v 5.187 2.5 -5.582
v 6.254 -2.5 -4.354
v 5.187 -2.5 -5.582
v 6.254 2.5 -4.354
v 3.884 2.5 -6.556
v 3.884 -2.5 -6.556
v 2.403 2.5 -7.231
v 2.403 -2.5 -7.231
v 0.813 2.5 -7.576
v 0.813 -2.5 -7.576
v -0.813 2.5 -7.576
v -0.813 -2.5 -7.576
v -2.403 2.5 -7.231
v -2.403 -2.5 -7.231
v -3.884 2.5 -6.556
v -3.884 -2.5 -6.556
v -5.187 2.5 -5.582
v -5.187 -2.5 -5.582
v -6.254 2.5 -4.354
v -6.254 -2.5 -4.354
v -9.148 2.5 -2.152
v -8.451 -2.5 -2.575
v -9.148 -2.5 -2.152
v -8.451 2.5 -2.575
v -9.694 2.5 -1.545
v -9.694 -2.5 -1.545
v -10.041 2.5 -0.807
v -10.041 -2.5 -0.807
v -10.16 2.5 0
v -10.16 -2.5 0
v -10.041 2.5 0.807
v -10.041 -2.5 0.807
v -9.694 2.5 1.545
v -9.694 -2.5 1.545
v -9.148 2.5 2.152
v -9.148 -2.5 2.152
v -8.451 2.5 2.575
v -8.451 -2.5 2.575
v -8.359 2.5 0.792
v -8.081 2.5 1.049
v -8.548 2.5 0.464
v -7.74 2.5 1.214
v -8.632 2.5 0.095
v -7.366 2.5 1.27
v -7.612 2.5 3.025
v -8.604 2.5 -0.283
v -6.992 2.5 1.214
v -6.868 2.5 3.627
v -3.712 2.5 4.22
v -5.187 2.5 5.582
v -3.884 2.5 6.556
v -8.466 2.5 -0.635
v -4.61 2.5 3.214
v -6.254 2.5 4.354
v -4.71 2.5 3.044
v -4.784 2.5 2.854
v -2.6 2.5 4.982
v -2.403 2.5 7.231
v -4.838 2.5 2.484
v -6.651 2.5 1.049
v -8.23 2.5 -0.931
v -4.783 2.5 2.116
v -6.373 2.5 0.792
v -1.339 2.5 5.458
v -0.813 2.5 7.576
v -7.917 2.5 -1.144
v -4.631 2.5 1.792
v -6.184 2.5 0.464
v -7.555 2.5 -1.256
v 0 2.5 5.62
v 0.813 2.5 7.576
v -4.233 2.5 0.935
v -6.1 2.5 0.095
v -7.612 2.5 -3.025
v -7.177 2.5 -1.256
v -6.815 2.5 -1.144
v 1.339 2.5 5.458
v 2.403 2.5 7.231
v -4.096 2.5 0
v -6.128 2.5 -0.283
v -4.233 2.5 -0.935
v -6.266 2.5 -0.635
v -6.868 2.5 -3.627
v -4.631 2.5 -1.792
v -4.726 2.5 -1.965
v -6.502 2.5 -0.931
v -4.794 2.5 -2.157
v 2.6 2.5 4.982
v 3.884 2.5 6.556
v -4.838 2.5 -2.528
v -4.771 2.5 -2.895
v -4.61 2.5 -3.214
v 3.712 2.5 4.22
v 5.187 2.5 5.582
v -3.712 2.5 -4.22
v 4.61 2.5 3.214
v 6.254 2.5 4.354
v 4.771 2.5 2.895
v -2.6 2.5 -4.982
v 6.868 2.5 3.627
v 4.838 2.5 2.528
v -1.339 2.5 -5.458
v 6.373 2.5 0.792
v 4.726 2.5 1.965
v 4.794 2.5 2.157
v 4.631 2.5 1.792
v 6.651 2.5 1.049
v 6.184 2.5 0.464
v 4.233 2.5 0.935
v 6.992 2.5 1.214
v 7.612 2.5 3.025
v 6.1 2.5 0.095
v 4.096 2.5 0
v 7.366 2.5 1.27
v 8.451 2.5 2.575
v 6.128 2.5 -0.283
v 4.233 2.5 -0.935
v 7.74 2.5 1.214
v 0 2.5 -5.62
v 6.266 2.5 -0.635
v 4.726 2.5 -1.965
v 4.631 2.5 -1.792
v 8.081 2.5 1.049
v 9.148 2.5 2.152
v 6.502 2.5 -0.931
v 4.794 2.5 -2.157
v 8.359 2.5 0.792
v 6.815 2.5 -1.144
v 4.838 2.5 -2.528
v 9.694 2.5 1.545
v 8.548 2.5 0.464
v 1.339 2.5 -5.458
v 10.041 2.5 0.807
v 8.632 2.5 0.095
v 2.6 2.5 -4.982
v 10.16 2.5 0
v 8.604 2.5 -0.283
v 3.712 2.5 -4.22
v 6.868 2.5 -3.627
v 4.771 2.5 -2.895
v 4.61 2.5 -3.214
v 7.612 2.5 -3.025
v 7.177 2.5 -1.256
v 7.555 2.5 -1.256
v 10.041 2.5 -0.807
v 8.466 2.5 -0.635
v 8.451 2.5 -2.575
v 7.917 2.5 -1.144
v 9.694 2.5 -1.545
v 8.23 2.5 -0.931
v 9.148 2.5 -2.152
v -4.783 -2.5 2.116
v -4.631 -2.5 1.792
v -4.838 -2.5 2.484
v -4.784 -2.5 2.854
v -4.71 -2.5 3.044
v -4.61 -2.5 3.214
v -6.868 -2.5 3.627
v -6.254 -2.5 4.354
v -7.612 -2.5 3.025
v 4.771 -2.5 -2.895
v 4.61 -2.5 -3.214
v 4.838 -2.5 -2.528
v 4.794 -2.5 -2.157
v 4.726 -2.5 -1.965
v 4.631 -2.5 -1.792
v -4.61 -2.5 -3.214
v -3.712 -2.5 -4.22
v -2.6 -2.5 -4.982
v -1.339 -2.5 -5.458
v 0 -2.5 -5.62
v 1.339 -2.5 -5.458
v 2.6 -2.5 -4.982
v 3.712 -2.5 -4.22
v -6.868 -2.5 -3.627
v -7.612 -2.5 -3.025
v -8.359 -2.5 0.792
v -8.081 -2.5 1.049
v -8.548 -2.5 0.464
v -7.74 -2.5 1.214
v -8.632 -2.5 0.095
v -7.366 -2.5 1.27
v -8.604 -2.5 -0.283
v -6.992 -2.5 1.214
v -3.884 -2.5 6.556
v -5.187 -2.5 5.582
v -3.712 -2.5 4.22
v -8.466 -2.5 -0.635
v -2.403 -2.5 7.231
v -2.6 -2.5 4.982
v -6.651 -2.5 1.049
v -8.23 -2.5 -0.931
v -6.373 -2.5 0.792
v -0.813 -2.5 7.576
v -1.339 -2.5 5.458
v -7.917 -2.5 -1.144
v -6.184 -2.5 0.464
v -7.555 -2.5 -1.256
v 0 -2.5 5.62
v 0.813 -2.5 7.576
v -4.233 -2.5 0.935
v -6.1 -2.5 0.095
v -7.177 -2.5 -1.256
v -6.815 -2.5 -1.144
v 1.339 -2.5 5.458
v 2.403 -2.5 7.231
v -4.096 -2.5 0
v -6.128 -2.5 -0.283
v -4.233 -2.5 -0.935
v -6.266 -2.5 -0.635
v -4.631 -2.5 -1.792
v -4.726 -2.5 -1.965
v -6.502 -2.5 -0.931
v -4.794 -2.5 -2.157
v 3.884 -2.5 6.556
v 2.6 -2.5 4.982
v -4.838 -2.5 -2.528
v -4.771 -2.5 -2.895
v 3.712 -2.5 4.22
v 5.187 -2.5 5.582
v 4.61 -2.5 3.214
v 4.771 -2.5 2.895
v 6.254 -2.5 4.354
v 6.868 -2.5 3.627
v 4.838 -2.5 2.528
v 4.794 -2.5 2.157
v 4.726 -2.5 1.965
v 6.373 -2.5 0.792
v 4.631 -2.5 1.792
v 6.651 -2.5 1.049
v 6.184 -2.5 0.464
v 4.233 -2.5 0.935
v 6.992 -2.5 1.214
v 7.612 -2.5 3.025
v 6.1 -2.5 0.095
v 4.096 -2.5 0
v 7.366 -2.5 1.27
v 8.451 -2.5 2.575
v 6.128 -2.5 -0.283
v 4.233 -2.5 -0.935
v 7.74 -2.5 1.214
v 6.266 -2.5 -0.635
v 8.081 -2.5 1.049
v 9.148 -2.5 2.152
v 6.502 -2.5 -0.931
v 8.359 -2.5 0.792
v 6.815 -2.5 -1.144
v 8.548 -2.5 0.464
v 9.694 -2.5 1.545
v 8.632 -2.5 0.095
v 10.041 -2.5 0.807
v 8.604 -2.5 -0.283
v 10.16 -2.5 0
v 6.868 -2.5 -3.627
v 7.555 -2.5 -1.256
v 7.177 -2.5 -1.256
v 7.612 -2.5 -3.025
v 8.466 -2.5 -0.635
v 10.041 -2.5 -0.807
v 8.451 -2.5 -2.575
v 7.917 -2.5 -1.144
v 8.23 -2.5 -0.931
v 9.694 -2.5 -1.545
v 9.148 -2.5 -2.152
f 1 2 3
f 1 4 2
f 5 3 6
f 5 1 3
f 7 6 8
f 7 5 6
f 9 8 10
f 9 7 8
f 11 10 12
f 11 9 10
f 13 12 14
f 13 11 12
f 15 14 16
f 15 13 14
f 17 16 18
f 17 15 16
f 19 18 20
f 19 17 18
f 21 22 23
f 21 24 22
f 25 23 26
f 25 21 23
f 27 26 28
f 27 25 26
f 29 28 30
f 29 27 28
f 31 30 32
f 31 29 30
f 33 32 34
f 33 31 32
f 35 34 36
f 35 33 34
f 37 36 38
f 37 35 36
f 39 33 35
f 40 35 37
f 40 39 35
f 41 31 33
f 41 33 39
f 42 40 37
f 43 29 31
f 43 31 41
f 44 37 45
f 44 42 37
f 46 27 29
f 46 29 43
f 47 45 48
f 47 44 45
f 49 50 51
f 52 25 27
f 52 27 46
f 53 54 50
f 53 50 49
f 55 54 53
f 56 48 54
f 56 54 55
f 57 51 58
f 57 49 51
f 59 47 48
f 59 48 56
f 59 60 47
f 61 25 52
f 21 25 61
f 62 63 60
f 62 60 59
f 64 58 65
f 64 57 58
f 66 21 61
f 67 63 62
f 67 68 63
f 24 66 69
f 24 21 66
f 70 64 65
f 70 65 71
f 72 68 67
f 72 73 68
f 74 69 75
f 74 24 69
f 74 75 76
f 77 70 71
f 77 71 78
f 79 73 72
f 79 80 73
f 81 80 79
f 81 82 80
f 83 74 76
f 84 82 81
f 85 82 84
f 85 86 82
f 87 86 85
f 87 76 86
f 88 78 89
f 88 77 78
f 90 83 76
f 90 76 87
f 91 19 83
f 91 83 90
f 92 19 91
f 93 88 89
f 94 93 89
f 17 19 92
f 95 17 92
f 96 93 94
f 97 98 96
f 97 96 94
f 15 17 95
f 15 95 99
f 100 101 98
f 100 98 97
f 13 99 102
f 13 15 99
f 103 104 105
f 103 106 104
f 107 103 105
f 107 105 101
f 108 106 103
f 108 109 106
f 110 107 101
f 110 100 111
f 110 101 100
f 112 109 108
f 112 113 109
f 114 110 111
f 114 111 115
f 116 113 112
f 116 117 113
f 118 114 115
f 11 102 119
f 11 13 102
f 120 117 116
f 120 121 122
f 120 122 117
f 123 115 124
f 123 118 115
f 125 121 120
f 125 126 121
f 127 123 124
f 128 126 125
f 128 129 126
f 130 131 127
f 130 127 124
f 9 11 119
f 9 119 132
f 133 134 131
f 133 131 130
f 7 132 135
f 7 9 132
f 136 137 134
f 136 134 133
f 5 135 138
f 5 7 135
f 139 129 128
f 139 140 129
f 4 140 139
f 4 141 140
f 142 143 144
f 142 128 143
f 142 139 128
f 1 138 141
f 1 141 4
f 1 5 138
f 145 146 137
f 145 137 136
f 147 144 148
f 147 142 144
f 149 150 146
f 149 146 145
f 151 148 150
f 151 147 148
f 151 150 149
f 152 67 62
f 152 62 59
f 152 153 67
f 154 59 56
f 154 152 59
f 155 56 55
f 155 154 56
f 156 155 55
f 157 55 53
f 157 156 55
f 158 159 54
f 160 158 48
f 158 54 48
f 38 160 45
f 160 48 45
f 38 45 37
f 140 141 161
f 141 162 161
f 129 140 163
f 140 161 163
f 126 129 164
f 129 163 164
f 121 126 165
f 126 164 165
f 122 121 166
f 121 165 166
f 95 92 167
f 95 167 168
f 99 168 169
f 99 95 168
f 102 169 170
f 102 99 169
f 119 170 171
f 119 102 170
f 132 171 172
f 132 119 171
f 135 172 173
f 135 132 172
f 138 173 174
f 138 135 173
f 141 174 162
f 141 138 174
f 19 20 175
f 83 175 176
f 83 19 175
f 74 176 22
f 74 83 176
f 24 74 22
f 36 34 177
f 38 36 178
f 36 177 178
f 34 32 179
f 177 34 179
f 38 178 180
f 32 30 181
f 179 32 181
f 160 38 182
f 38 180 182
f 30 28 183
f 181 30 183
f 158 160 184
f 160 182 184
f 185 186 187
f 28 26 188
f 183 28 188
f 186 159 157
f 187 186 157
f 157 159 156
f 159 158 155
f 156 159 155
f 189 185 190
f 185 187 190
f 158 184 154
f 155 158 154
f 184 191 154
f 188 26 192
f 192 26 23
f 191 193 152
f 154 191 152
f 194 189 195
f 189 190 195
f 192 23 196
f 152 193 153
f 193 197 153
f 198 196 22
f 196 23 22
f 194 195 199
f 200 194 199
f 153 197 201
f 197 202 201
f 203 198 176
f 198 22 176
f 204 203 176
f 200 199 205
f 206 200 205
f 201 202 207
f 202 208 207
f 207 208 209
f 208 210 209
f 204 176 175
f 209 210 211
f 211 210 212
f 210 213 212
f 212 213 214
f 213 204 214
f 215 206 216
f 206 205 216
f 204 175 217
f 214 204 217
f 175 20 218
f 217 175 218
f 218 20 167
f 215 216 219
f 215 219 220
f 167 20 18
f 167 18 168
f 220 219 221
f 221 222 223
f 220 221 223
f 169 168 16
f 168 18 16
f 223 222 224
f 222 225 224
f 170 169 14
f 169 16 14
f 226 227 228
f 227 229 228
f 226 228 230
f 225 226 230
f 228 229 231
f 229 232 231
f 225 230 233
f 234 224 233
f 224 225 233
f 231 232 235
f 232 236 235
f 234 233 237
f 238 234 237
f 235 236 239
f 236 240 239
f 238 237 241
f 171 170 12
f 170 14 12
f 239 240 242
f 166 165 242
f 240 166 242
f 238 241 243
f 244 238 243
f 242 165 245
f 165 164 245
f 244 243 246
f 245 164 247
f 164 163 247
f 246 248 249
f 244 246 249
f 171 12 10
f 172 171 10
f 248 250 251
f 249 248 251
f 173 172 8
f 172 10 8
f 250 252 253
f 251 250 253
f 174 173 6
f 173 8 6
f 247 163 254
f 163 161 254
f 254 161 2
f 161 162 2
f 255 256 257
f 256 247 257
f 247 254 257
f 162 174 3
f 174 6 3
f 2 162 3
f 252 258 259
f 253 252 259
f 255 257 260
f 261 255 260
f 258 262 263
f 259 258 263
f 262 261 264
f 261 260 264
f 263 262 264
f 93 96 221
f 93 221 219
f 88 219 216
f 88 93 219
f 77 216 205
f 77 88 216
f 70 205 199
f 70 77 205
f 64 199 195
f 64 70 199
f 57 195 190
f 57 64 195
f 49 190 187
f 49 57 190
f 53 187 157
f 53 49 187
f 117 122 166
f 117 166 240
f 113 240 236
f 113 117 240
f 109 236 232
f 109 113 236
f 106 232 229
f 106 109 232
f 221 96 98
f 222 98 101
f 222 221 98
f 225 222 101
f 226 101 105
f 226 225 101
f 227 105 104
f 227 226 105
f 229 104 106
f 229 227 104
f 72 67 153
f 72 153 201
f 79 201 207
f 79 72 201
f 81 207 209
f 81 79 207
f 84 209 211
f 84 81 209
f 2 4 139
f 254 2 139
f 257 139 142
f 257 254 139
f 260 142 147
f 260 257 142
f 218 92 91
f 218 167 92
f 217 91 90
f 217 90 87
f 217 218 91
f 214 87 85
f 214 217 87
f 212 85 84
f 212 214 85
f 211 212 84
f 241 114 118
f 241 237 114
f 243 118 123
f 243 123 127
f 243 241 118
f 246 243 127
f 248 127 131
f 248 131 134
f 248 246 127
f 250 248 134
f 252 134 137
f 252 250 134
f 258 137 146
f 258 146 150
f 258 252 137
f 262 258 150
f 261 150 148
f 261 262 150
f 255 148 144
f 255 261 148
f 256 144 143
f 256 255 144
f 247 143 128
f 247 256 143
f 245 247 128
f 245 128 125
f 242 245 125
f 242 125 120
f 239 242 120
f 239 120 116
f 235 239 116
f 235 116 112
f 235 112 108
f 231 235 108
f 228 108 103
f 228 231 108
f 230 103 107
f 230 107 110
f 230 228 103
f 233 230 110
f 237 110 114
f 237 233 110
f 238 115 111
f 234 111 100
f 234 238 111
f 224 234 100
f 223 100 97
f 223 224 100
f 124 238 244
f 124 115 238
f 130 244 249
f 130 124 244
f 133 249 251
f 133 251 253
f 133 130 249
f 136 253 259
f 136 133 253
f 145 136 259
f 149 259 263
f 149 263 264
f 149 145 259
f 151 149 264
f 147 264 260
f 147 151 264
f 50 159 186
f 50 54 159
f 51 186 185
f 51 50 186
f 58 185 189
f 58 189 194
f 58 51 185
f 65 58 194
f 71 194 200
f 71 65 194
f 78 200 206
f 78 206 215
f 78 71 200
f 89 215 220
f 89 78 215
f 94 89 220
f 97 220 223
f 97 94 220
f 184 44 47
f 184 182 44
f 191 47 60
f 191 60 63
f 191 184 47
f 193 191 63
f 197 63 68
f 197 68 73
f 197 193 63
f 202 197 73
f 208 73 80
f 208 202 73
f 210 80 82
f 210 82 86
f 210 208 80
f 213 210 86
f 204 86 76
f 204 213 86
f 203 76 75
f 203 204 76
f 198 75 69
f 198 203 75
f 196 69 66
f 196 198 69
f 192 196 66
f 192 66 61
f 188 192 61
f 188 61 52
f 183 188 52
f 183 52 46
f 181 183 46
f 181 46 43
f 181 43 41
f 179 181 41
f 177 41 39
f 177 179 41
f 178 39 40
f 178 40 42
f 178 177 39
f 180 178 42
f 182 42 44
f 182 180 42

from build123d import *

# Parameters (mm, degrees)
SKETCH1_R           = 1.27
BOSS_EXTRUDE1_DEPTH = 2.5
FILLET1_R           = 5.08
CUT_EXTRUDE1_DEPTH  = 14.648809639
FILLET2_R           = 1.27


with BuildPart() as part:
    # Sketch1 → Boss-Extrude1 (new, symmetric)
    with BuildSketch(Plane(origin=(0, 0, 0), x_dir=(1, 0, 0), z_dir=(0, 1, 0))):
        with BuildLine():
            ThreePointArc((7.094482759, 2.780775861), (0, 7.62), (-7.094482759, 2.780775861))
            ThreePointArc((-7.094482759, 2.780775861), (-10.16, 0), (-7.094482759, -2.780775861))
            ThreePointArc((-7.094482759, -2.780775861), (0, -7.62), (7.094482759, -2.780775861))
            ThreePointArc((7.094482759, -2.780775861), (10.16, 0), (7.094482759, 2.780775861))
        make_face()
        with Locations((7.366, 0)):
            Circle(SKETCH1_R, mode=Mode.SUBTRACT)
        with Locations((-7.366, 0)):
            Circle(SKETCH1_R, mode=Mode.SUBTRACT)
    extrude(amount=BOSS_EXTRUDE1_DEPTH, both=True)

    # Fillet1
    fillet1_edges = [part.edges().sort_by_distance(p)[0] for p in [
        (7.094482759, 0, -2.780775861),
        (-7.094482759, 0, -2.780775861),
        (-7.094482759, 0, 2.780775861),
        (7.094482759, 0, 2.780775861),
    ]]
    fillet(fillet1_edges, radius=FILLET1_R)

    # Sketch2 → Cut-Extrude1 (cut, through all)
    with BuildSketch(Plane(origin=(0, 2.5, 0), x_dir=(1, 0, 0), z_dir=(0, 1, 0))):
        with BuildLine():
            ThreePointArc((5.213513626, 2.46164628), (4.096, 0), (5.213513626, -2.46164628))
            ThreePointArc((5.213513626, -2.46164628), (4.900166041, -2.826173582), (4.612275862, -3.21112307))
            ThreePointArc((4.612275862, -3.21112307), (0, -5.62), (-4.612275862, -3.21112307))
            ThreePointArc((-4.612275862, -3.21112307), (-4.900166041, -2.826173582), (-5.213513626, -2.46164628))
            ThreePointArc((-5.213513626, -2.46164628), (-4.096, 0), (-5.213513626, 2.46164628))
            ThreePointArc((-5.213513626, 2.46164628), (-4.900166041, 2.826173582), (-4.612275862, 3.21112307))
            ThreePointArc((-4.612275862, 3.21112307), (0, 5.62), (4.612275862, 3.21112307))
            ThreePointArc((4.612275862, 3.21112307), (4.900166041, 2.826173582), (5.213513626, 2.46164628))
        make_face()
    extrude(amount=-CUT_EXTRUDE1_DEPTH, mode=Mode.SUBTRACT)

    # Fillet2
    fillet2_edges = [part.edges().sort_by_distance(p)[0] for p in [
        (5.213513626, 0, -2.46164628),
        (-5.213513626, 0, -2.46164628),
        (-5.213513626, 0, 2.46164628),
        (5.213513626, 0, 2.46164628),
    ]]
    fillet(fillet2_edges, radius=FILLET2_R)


solid = part.part
